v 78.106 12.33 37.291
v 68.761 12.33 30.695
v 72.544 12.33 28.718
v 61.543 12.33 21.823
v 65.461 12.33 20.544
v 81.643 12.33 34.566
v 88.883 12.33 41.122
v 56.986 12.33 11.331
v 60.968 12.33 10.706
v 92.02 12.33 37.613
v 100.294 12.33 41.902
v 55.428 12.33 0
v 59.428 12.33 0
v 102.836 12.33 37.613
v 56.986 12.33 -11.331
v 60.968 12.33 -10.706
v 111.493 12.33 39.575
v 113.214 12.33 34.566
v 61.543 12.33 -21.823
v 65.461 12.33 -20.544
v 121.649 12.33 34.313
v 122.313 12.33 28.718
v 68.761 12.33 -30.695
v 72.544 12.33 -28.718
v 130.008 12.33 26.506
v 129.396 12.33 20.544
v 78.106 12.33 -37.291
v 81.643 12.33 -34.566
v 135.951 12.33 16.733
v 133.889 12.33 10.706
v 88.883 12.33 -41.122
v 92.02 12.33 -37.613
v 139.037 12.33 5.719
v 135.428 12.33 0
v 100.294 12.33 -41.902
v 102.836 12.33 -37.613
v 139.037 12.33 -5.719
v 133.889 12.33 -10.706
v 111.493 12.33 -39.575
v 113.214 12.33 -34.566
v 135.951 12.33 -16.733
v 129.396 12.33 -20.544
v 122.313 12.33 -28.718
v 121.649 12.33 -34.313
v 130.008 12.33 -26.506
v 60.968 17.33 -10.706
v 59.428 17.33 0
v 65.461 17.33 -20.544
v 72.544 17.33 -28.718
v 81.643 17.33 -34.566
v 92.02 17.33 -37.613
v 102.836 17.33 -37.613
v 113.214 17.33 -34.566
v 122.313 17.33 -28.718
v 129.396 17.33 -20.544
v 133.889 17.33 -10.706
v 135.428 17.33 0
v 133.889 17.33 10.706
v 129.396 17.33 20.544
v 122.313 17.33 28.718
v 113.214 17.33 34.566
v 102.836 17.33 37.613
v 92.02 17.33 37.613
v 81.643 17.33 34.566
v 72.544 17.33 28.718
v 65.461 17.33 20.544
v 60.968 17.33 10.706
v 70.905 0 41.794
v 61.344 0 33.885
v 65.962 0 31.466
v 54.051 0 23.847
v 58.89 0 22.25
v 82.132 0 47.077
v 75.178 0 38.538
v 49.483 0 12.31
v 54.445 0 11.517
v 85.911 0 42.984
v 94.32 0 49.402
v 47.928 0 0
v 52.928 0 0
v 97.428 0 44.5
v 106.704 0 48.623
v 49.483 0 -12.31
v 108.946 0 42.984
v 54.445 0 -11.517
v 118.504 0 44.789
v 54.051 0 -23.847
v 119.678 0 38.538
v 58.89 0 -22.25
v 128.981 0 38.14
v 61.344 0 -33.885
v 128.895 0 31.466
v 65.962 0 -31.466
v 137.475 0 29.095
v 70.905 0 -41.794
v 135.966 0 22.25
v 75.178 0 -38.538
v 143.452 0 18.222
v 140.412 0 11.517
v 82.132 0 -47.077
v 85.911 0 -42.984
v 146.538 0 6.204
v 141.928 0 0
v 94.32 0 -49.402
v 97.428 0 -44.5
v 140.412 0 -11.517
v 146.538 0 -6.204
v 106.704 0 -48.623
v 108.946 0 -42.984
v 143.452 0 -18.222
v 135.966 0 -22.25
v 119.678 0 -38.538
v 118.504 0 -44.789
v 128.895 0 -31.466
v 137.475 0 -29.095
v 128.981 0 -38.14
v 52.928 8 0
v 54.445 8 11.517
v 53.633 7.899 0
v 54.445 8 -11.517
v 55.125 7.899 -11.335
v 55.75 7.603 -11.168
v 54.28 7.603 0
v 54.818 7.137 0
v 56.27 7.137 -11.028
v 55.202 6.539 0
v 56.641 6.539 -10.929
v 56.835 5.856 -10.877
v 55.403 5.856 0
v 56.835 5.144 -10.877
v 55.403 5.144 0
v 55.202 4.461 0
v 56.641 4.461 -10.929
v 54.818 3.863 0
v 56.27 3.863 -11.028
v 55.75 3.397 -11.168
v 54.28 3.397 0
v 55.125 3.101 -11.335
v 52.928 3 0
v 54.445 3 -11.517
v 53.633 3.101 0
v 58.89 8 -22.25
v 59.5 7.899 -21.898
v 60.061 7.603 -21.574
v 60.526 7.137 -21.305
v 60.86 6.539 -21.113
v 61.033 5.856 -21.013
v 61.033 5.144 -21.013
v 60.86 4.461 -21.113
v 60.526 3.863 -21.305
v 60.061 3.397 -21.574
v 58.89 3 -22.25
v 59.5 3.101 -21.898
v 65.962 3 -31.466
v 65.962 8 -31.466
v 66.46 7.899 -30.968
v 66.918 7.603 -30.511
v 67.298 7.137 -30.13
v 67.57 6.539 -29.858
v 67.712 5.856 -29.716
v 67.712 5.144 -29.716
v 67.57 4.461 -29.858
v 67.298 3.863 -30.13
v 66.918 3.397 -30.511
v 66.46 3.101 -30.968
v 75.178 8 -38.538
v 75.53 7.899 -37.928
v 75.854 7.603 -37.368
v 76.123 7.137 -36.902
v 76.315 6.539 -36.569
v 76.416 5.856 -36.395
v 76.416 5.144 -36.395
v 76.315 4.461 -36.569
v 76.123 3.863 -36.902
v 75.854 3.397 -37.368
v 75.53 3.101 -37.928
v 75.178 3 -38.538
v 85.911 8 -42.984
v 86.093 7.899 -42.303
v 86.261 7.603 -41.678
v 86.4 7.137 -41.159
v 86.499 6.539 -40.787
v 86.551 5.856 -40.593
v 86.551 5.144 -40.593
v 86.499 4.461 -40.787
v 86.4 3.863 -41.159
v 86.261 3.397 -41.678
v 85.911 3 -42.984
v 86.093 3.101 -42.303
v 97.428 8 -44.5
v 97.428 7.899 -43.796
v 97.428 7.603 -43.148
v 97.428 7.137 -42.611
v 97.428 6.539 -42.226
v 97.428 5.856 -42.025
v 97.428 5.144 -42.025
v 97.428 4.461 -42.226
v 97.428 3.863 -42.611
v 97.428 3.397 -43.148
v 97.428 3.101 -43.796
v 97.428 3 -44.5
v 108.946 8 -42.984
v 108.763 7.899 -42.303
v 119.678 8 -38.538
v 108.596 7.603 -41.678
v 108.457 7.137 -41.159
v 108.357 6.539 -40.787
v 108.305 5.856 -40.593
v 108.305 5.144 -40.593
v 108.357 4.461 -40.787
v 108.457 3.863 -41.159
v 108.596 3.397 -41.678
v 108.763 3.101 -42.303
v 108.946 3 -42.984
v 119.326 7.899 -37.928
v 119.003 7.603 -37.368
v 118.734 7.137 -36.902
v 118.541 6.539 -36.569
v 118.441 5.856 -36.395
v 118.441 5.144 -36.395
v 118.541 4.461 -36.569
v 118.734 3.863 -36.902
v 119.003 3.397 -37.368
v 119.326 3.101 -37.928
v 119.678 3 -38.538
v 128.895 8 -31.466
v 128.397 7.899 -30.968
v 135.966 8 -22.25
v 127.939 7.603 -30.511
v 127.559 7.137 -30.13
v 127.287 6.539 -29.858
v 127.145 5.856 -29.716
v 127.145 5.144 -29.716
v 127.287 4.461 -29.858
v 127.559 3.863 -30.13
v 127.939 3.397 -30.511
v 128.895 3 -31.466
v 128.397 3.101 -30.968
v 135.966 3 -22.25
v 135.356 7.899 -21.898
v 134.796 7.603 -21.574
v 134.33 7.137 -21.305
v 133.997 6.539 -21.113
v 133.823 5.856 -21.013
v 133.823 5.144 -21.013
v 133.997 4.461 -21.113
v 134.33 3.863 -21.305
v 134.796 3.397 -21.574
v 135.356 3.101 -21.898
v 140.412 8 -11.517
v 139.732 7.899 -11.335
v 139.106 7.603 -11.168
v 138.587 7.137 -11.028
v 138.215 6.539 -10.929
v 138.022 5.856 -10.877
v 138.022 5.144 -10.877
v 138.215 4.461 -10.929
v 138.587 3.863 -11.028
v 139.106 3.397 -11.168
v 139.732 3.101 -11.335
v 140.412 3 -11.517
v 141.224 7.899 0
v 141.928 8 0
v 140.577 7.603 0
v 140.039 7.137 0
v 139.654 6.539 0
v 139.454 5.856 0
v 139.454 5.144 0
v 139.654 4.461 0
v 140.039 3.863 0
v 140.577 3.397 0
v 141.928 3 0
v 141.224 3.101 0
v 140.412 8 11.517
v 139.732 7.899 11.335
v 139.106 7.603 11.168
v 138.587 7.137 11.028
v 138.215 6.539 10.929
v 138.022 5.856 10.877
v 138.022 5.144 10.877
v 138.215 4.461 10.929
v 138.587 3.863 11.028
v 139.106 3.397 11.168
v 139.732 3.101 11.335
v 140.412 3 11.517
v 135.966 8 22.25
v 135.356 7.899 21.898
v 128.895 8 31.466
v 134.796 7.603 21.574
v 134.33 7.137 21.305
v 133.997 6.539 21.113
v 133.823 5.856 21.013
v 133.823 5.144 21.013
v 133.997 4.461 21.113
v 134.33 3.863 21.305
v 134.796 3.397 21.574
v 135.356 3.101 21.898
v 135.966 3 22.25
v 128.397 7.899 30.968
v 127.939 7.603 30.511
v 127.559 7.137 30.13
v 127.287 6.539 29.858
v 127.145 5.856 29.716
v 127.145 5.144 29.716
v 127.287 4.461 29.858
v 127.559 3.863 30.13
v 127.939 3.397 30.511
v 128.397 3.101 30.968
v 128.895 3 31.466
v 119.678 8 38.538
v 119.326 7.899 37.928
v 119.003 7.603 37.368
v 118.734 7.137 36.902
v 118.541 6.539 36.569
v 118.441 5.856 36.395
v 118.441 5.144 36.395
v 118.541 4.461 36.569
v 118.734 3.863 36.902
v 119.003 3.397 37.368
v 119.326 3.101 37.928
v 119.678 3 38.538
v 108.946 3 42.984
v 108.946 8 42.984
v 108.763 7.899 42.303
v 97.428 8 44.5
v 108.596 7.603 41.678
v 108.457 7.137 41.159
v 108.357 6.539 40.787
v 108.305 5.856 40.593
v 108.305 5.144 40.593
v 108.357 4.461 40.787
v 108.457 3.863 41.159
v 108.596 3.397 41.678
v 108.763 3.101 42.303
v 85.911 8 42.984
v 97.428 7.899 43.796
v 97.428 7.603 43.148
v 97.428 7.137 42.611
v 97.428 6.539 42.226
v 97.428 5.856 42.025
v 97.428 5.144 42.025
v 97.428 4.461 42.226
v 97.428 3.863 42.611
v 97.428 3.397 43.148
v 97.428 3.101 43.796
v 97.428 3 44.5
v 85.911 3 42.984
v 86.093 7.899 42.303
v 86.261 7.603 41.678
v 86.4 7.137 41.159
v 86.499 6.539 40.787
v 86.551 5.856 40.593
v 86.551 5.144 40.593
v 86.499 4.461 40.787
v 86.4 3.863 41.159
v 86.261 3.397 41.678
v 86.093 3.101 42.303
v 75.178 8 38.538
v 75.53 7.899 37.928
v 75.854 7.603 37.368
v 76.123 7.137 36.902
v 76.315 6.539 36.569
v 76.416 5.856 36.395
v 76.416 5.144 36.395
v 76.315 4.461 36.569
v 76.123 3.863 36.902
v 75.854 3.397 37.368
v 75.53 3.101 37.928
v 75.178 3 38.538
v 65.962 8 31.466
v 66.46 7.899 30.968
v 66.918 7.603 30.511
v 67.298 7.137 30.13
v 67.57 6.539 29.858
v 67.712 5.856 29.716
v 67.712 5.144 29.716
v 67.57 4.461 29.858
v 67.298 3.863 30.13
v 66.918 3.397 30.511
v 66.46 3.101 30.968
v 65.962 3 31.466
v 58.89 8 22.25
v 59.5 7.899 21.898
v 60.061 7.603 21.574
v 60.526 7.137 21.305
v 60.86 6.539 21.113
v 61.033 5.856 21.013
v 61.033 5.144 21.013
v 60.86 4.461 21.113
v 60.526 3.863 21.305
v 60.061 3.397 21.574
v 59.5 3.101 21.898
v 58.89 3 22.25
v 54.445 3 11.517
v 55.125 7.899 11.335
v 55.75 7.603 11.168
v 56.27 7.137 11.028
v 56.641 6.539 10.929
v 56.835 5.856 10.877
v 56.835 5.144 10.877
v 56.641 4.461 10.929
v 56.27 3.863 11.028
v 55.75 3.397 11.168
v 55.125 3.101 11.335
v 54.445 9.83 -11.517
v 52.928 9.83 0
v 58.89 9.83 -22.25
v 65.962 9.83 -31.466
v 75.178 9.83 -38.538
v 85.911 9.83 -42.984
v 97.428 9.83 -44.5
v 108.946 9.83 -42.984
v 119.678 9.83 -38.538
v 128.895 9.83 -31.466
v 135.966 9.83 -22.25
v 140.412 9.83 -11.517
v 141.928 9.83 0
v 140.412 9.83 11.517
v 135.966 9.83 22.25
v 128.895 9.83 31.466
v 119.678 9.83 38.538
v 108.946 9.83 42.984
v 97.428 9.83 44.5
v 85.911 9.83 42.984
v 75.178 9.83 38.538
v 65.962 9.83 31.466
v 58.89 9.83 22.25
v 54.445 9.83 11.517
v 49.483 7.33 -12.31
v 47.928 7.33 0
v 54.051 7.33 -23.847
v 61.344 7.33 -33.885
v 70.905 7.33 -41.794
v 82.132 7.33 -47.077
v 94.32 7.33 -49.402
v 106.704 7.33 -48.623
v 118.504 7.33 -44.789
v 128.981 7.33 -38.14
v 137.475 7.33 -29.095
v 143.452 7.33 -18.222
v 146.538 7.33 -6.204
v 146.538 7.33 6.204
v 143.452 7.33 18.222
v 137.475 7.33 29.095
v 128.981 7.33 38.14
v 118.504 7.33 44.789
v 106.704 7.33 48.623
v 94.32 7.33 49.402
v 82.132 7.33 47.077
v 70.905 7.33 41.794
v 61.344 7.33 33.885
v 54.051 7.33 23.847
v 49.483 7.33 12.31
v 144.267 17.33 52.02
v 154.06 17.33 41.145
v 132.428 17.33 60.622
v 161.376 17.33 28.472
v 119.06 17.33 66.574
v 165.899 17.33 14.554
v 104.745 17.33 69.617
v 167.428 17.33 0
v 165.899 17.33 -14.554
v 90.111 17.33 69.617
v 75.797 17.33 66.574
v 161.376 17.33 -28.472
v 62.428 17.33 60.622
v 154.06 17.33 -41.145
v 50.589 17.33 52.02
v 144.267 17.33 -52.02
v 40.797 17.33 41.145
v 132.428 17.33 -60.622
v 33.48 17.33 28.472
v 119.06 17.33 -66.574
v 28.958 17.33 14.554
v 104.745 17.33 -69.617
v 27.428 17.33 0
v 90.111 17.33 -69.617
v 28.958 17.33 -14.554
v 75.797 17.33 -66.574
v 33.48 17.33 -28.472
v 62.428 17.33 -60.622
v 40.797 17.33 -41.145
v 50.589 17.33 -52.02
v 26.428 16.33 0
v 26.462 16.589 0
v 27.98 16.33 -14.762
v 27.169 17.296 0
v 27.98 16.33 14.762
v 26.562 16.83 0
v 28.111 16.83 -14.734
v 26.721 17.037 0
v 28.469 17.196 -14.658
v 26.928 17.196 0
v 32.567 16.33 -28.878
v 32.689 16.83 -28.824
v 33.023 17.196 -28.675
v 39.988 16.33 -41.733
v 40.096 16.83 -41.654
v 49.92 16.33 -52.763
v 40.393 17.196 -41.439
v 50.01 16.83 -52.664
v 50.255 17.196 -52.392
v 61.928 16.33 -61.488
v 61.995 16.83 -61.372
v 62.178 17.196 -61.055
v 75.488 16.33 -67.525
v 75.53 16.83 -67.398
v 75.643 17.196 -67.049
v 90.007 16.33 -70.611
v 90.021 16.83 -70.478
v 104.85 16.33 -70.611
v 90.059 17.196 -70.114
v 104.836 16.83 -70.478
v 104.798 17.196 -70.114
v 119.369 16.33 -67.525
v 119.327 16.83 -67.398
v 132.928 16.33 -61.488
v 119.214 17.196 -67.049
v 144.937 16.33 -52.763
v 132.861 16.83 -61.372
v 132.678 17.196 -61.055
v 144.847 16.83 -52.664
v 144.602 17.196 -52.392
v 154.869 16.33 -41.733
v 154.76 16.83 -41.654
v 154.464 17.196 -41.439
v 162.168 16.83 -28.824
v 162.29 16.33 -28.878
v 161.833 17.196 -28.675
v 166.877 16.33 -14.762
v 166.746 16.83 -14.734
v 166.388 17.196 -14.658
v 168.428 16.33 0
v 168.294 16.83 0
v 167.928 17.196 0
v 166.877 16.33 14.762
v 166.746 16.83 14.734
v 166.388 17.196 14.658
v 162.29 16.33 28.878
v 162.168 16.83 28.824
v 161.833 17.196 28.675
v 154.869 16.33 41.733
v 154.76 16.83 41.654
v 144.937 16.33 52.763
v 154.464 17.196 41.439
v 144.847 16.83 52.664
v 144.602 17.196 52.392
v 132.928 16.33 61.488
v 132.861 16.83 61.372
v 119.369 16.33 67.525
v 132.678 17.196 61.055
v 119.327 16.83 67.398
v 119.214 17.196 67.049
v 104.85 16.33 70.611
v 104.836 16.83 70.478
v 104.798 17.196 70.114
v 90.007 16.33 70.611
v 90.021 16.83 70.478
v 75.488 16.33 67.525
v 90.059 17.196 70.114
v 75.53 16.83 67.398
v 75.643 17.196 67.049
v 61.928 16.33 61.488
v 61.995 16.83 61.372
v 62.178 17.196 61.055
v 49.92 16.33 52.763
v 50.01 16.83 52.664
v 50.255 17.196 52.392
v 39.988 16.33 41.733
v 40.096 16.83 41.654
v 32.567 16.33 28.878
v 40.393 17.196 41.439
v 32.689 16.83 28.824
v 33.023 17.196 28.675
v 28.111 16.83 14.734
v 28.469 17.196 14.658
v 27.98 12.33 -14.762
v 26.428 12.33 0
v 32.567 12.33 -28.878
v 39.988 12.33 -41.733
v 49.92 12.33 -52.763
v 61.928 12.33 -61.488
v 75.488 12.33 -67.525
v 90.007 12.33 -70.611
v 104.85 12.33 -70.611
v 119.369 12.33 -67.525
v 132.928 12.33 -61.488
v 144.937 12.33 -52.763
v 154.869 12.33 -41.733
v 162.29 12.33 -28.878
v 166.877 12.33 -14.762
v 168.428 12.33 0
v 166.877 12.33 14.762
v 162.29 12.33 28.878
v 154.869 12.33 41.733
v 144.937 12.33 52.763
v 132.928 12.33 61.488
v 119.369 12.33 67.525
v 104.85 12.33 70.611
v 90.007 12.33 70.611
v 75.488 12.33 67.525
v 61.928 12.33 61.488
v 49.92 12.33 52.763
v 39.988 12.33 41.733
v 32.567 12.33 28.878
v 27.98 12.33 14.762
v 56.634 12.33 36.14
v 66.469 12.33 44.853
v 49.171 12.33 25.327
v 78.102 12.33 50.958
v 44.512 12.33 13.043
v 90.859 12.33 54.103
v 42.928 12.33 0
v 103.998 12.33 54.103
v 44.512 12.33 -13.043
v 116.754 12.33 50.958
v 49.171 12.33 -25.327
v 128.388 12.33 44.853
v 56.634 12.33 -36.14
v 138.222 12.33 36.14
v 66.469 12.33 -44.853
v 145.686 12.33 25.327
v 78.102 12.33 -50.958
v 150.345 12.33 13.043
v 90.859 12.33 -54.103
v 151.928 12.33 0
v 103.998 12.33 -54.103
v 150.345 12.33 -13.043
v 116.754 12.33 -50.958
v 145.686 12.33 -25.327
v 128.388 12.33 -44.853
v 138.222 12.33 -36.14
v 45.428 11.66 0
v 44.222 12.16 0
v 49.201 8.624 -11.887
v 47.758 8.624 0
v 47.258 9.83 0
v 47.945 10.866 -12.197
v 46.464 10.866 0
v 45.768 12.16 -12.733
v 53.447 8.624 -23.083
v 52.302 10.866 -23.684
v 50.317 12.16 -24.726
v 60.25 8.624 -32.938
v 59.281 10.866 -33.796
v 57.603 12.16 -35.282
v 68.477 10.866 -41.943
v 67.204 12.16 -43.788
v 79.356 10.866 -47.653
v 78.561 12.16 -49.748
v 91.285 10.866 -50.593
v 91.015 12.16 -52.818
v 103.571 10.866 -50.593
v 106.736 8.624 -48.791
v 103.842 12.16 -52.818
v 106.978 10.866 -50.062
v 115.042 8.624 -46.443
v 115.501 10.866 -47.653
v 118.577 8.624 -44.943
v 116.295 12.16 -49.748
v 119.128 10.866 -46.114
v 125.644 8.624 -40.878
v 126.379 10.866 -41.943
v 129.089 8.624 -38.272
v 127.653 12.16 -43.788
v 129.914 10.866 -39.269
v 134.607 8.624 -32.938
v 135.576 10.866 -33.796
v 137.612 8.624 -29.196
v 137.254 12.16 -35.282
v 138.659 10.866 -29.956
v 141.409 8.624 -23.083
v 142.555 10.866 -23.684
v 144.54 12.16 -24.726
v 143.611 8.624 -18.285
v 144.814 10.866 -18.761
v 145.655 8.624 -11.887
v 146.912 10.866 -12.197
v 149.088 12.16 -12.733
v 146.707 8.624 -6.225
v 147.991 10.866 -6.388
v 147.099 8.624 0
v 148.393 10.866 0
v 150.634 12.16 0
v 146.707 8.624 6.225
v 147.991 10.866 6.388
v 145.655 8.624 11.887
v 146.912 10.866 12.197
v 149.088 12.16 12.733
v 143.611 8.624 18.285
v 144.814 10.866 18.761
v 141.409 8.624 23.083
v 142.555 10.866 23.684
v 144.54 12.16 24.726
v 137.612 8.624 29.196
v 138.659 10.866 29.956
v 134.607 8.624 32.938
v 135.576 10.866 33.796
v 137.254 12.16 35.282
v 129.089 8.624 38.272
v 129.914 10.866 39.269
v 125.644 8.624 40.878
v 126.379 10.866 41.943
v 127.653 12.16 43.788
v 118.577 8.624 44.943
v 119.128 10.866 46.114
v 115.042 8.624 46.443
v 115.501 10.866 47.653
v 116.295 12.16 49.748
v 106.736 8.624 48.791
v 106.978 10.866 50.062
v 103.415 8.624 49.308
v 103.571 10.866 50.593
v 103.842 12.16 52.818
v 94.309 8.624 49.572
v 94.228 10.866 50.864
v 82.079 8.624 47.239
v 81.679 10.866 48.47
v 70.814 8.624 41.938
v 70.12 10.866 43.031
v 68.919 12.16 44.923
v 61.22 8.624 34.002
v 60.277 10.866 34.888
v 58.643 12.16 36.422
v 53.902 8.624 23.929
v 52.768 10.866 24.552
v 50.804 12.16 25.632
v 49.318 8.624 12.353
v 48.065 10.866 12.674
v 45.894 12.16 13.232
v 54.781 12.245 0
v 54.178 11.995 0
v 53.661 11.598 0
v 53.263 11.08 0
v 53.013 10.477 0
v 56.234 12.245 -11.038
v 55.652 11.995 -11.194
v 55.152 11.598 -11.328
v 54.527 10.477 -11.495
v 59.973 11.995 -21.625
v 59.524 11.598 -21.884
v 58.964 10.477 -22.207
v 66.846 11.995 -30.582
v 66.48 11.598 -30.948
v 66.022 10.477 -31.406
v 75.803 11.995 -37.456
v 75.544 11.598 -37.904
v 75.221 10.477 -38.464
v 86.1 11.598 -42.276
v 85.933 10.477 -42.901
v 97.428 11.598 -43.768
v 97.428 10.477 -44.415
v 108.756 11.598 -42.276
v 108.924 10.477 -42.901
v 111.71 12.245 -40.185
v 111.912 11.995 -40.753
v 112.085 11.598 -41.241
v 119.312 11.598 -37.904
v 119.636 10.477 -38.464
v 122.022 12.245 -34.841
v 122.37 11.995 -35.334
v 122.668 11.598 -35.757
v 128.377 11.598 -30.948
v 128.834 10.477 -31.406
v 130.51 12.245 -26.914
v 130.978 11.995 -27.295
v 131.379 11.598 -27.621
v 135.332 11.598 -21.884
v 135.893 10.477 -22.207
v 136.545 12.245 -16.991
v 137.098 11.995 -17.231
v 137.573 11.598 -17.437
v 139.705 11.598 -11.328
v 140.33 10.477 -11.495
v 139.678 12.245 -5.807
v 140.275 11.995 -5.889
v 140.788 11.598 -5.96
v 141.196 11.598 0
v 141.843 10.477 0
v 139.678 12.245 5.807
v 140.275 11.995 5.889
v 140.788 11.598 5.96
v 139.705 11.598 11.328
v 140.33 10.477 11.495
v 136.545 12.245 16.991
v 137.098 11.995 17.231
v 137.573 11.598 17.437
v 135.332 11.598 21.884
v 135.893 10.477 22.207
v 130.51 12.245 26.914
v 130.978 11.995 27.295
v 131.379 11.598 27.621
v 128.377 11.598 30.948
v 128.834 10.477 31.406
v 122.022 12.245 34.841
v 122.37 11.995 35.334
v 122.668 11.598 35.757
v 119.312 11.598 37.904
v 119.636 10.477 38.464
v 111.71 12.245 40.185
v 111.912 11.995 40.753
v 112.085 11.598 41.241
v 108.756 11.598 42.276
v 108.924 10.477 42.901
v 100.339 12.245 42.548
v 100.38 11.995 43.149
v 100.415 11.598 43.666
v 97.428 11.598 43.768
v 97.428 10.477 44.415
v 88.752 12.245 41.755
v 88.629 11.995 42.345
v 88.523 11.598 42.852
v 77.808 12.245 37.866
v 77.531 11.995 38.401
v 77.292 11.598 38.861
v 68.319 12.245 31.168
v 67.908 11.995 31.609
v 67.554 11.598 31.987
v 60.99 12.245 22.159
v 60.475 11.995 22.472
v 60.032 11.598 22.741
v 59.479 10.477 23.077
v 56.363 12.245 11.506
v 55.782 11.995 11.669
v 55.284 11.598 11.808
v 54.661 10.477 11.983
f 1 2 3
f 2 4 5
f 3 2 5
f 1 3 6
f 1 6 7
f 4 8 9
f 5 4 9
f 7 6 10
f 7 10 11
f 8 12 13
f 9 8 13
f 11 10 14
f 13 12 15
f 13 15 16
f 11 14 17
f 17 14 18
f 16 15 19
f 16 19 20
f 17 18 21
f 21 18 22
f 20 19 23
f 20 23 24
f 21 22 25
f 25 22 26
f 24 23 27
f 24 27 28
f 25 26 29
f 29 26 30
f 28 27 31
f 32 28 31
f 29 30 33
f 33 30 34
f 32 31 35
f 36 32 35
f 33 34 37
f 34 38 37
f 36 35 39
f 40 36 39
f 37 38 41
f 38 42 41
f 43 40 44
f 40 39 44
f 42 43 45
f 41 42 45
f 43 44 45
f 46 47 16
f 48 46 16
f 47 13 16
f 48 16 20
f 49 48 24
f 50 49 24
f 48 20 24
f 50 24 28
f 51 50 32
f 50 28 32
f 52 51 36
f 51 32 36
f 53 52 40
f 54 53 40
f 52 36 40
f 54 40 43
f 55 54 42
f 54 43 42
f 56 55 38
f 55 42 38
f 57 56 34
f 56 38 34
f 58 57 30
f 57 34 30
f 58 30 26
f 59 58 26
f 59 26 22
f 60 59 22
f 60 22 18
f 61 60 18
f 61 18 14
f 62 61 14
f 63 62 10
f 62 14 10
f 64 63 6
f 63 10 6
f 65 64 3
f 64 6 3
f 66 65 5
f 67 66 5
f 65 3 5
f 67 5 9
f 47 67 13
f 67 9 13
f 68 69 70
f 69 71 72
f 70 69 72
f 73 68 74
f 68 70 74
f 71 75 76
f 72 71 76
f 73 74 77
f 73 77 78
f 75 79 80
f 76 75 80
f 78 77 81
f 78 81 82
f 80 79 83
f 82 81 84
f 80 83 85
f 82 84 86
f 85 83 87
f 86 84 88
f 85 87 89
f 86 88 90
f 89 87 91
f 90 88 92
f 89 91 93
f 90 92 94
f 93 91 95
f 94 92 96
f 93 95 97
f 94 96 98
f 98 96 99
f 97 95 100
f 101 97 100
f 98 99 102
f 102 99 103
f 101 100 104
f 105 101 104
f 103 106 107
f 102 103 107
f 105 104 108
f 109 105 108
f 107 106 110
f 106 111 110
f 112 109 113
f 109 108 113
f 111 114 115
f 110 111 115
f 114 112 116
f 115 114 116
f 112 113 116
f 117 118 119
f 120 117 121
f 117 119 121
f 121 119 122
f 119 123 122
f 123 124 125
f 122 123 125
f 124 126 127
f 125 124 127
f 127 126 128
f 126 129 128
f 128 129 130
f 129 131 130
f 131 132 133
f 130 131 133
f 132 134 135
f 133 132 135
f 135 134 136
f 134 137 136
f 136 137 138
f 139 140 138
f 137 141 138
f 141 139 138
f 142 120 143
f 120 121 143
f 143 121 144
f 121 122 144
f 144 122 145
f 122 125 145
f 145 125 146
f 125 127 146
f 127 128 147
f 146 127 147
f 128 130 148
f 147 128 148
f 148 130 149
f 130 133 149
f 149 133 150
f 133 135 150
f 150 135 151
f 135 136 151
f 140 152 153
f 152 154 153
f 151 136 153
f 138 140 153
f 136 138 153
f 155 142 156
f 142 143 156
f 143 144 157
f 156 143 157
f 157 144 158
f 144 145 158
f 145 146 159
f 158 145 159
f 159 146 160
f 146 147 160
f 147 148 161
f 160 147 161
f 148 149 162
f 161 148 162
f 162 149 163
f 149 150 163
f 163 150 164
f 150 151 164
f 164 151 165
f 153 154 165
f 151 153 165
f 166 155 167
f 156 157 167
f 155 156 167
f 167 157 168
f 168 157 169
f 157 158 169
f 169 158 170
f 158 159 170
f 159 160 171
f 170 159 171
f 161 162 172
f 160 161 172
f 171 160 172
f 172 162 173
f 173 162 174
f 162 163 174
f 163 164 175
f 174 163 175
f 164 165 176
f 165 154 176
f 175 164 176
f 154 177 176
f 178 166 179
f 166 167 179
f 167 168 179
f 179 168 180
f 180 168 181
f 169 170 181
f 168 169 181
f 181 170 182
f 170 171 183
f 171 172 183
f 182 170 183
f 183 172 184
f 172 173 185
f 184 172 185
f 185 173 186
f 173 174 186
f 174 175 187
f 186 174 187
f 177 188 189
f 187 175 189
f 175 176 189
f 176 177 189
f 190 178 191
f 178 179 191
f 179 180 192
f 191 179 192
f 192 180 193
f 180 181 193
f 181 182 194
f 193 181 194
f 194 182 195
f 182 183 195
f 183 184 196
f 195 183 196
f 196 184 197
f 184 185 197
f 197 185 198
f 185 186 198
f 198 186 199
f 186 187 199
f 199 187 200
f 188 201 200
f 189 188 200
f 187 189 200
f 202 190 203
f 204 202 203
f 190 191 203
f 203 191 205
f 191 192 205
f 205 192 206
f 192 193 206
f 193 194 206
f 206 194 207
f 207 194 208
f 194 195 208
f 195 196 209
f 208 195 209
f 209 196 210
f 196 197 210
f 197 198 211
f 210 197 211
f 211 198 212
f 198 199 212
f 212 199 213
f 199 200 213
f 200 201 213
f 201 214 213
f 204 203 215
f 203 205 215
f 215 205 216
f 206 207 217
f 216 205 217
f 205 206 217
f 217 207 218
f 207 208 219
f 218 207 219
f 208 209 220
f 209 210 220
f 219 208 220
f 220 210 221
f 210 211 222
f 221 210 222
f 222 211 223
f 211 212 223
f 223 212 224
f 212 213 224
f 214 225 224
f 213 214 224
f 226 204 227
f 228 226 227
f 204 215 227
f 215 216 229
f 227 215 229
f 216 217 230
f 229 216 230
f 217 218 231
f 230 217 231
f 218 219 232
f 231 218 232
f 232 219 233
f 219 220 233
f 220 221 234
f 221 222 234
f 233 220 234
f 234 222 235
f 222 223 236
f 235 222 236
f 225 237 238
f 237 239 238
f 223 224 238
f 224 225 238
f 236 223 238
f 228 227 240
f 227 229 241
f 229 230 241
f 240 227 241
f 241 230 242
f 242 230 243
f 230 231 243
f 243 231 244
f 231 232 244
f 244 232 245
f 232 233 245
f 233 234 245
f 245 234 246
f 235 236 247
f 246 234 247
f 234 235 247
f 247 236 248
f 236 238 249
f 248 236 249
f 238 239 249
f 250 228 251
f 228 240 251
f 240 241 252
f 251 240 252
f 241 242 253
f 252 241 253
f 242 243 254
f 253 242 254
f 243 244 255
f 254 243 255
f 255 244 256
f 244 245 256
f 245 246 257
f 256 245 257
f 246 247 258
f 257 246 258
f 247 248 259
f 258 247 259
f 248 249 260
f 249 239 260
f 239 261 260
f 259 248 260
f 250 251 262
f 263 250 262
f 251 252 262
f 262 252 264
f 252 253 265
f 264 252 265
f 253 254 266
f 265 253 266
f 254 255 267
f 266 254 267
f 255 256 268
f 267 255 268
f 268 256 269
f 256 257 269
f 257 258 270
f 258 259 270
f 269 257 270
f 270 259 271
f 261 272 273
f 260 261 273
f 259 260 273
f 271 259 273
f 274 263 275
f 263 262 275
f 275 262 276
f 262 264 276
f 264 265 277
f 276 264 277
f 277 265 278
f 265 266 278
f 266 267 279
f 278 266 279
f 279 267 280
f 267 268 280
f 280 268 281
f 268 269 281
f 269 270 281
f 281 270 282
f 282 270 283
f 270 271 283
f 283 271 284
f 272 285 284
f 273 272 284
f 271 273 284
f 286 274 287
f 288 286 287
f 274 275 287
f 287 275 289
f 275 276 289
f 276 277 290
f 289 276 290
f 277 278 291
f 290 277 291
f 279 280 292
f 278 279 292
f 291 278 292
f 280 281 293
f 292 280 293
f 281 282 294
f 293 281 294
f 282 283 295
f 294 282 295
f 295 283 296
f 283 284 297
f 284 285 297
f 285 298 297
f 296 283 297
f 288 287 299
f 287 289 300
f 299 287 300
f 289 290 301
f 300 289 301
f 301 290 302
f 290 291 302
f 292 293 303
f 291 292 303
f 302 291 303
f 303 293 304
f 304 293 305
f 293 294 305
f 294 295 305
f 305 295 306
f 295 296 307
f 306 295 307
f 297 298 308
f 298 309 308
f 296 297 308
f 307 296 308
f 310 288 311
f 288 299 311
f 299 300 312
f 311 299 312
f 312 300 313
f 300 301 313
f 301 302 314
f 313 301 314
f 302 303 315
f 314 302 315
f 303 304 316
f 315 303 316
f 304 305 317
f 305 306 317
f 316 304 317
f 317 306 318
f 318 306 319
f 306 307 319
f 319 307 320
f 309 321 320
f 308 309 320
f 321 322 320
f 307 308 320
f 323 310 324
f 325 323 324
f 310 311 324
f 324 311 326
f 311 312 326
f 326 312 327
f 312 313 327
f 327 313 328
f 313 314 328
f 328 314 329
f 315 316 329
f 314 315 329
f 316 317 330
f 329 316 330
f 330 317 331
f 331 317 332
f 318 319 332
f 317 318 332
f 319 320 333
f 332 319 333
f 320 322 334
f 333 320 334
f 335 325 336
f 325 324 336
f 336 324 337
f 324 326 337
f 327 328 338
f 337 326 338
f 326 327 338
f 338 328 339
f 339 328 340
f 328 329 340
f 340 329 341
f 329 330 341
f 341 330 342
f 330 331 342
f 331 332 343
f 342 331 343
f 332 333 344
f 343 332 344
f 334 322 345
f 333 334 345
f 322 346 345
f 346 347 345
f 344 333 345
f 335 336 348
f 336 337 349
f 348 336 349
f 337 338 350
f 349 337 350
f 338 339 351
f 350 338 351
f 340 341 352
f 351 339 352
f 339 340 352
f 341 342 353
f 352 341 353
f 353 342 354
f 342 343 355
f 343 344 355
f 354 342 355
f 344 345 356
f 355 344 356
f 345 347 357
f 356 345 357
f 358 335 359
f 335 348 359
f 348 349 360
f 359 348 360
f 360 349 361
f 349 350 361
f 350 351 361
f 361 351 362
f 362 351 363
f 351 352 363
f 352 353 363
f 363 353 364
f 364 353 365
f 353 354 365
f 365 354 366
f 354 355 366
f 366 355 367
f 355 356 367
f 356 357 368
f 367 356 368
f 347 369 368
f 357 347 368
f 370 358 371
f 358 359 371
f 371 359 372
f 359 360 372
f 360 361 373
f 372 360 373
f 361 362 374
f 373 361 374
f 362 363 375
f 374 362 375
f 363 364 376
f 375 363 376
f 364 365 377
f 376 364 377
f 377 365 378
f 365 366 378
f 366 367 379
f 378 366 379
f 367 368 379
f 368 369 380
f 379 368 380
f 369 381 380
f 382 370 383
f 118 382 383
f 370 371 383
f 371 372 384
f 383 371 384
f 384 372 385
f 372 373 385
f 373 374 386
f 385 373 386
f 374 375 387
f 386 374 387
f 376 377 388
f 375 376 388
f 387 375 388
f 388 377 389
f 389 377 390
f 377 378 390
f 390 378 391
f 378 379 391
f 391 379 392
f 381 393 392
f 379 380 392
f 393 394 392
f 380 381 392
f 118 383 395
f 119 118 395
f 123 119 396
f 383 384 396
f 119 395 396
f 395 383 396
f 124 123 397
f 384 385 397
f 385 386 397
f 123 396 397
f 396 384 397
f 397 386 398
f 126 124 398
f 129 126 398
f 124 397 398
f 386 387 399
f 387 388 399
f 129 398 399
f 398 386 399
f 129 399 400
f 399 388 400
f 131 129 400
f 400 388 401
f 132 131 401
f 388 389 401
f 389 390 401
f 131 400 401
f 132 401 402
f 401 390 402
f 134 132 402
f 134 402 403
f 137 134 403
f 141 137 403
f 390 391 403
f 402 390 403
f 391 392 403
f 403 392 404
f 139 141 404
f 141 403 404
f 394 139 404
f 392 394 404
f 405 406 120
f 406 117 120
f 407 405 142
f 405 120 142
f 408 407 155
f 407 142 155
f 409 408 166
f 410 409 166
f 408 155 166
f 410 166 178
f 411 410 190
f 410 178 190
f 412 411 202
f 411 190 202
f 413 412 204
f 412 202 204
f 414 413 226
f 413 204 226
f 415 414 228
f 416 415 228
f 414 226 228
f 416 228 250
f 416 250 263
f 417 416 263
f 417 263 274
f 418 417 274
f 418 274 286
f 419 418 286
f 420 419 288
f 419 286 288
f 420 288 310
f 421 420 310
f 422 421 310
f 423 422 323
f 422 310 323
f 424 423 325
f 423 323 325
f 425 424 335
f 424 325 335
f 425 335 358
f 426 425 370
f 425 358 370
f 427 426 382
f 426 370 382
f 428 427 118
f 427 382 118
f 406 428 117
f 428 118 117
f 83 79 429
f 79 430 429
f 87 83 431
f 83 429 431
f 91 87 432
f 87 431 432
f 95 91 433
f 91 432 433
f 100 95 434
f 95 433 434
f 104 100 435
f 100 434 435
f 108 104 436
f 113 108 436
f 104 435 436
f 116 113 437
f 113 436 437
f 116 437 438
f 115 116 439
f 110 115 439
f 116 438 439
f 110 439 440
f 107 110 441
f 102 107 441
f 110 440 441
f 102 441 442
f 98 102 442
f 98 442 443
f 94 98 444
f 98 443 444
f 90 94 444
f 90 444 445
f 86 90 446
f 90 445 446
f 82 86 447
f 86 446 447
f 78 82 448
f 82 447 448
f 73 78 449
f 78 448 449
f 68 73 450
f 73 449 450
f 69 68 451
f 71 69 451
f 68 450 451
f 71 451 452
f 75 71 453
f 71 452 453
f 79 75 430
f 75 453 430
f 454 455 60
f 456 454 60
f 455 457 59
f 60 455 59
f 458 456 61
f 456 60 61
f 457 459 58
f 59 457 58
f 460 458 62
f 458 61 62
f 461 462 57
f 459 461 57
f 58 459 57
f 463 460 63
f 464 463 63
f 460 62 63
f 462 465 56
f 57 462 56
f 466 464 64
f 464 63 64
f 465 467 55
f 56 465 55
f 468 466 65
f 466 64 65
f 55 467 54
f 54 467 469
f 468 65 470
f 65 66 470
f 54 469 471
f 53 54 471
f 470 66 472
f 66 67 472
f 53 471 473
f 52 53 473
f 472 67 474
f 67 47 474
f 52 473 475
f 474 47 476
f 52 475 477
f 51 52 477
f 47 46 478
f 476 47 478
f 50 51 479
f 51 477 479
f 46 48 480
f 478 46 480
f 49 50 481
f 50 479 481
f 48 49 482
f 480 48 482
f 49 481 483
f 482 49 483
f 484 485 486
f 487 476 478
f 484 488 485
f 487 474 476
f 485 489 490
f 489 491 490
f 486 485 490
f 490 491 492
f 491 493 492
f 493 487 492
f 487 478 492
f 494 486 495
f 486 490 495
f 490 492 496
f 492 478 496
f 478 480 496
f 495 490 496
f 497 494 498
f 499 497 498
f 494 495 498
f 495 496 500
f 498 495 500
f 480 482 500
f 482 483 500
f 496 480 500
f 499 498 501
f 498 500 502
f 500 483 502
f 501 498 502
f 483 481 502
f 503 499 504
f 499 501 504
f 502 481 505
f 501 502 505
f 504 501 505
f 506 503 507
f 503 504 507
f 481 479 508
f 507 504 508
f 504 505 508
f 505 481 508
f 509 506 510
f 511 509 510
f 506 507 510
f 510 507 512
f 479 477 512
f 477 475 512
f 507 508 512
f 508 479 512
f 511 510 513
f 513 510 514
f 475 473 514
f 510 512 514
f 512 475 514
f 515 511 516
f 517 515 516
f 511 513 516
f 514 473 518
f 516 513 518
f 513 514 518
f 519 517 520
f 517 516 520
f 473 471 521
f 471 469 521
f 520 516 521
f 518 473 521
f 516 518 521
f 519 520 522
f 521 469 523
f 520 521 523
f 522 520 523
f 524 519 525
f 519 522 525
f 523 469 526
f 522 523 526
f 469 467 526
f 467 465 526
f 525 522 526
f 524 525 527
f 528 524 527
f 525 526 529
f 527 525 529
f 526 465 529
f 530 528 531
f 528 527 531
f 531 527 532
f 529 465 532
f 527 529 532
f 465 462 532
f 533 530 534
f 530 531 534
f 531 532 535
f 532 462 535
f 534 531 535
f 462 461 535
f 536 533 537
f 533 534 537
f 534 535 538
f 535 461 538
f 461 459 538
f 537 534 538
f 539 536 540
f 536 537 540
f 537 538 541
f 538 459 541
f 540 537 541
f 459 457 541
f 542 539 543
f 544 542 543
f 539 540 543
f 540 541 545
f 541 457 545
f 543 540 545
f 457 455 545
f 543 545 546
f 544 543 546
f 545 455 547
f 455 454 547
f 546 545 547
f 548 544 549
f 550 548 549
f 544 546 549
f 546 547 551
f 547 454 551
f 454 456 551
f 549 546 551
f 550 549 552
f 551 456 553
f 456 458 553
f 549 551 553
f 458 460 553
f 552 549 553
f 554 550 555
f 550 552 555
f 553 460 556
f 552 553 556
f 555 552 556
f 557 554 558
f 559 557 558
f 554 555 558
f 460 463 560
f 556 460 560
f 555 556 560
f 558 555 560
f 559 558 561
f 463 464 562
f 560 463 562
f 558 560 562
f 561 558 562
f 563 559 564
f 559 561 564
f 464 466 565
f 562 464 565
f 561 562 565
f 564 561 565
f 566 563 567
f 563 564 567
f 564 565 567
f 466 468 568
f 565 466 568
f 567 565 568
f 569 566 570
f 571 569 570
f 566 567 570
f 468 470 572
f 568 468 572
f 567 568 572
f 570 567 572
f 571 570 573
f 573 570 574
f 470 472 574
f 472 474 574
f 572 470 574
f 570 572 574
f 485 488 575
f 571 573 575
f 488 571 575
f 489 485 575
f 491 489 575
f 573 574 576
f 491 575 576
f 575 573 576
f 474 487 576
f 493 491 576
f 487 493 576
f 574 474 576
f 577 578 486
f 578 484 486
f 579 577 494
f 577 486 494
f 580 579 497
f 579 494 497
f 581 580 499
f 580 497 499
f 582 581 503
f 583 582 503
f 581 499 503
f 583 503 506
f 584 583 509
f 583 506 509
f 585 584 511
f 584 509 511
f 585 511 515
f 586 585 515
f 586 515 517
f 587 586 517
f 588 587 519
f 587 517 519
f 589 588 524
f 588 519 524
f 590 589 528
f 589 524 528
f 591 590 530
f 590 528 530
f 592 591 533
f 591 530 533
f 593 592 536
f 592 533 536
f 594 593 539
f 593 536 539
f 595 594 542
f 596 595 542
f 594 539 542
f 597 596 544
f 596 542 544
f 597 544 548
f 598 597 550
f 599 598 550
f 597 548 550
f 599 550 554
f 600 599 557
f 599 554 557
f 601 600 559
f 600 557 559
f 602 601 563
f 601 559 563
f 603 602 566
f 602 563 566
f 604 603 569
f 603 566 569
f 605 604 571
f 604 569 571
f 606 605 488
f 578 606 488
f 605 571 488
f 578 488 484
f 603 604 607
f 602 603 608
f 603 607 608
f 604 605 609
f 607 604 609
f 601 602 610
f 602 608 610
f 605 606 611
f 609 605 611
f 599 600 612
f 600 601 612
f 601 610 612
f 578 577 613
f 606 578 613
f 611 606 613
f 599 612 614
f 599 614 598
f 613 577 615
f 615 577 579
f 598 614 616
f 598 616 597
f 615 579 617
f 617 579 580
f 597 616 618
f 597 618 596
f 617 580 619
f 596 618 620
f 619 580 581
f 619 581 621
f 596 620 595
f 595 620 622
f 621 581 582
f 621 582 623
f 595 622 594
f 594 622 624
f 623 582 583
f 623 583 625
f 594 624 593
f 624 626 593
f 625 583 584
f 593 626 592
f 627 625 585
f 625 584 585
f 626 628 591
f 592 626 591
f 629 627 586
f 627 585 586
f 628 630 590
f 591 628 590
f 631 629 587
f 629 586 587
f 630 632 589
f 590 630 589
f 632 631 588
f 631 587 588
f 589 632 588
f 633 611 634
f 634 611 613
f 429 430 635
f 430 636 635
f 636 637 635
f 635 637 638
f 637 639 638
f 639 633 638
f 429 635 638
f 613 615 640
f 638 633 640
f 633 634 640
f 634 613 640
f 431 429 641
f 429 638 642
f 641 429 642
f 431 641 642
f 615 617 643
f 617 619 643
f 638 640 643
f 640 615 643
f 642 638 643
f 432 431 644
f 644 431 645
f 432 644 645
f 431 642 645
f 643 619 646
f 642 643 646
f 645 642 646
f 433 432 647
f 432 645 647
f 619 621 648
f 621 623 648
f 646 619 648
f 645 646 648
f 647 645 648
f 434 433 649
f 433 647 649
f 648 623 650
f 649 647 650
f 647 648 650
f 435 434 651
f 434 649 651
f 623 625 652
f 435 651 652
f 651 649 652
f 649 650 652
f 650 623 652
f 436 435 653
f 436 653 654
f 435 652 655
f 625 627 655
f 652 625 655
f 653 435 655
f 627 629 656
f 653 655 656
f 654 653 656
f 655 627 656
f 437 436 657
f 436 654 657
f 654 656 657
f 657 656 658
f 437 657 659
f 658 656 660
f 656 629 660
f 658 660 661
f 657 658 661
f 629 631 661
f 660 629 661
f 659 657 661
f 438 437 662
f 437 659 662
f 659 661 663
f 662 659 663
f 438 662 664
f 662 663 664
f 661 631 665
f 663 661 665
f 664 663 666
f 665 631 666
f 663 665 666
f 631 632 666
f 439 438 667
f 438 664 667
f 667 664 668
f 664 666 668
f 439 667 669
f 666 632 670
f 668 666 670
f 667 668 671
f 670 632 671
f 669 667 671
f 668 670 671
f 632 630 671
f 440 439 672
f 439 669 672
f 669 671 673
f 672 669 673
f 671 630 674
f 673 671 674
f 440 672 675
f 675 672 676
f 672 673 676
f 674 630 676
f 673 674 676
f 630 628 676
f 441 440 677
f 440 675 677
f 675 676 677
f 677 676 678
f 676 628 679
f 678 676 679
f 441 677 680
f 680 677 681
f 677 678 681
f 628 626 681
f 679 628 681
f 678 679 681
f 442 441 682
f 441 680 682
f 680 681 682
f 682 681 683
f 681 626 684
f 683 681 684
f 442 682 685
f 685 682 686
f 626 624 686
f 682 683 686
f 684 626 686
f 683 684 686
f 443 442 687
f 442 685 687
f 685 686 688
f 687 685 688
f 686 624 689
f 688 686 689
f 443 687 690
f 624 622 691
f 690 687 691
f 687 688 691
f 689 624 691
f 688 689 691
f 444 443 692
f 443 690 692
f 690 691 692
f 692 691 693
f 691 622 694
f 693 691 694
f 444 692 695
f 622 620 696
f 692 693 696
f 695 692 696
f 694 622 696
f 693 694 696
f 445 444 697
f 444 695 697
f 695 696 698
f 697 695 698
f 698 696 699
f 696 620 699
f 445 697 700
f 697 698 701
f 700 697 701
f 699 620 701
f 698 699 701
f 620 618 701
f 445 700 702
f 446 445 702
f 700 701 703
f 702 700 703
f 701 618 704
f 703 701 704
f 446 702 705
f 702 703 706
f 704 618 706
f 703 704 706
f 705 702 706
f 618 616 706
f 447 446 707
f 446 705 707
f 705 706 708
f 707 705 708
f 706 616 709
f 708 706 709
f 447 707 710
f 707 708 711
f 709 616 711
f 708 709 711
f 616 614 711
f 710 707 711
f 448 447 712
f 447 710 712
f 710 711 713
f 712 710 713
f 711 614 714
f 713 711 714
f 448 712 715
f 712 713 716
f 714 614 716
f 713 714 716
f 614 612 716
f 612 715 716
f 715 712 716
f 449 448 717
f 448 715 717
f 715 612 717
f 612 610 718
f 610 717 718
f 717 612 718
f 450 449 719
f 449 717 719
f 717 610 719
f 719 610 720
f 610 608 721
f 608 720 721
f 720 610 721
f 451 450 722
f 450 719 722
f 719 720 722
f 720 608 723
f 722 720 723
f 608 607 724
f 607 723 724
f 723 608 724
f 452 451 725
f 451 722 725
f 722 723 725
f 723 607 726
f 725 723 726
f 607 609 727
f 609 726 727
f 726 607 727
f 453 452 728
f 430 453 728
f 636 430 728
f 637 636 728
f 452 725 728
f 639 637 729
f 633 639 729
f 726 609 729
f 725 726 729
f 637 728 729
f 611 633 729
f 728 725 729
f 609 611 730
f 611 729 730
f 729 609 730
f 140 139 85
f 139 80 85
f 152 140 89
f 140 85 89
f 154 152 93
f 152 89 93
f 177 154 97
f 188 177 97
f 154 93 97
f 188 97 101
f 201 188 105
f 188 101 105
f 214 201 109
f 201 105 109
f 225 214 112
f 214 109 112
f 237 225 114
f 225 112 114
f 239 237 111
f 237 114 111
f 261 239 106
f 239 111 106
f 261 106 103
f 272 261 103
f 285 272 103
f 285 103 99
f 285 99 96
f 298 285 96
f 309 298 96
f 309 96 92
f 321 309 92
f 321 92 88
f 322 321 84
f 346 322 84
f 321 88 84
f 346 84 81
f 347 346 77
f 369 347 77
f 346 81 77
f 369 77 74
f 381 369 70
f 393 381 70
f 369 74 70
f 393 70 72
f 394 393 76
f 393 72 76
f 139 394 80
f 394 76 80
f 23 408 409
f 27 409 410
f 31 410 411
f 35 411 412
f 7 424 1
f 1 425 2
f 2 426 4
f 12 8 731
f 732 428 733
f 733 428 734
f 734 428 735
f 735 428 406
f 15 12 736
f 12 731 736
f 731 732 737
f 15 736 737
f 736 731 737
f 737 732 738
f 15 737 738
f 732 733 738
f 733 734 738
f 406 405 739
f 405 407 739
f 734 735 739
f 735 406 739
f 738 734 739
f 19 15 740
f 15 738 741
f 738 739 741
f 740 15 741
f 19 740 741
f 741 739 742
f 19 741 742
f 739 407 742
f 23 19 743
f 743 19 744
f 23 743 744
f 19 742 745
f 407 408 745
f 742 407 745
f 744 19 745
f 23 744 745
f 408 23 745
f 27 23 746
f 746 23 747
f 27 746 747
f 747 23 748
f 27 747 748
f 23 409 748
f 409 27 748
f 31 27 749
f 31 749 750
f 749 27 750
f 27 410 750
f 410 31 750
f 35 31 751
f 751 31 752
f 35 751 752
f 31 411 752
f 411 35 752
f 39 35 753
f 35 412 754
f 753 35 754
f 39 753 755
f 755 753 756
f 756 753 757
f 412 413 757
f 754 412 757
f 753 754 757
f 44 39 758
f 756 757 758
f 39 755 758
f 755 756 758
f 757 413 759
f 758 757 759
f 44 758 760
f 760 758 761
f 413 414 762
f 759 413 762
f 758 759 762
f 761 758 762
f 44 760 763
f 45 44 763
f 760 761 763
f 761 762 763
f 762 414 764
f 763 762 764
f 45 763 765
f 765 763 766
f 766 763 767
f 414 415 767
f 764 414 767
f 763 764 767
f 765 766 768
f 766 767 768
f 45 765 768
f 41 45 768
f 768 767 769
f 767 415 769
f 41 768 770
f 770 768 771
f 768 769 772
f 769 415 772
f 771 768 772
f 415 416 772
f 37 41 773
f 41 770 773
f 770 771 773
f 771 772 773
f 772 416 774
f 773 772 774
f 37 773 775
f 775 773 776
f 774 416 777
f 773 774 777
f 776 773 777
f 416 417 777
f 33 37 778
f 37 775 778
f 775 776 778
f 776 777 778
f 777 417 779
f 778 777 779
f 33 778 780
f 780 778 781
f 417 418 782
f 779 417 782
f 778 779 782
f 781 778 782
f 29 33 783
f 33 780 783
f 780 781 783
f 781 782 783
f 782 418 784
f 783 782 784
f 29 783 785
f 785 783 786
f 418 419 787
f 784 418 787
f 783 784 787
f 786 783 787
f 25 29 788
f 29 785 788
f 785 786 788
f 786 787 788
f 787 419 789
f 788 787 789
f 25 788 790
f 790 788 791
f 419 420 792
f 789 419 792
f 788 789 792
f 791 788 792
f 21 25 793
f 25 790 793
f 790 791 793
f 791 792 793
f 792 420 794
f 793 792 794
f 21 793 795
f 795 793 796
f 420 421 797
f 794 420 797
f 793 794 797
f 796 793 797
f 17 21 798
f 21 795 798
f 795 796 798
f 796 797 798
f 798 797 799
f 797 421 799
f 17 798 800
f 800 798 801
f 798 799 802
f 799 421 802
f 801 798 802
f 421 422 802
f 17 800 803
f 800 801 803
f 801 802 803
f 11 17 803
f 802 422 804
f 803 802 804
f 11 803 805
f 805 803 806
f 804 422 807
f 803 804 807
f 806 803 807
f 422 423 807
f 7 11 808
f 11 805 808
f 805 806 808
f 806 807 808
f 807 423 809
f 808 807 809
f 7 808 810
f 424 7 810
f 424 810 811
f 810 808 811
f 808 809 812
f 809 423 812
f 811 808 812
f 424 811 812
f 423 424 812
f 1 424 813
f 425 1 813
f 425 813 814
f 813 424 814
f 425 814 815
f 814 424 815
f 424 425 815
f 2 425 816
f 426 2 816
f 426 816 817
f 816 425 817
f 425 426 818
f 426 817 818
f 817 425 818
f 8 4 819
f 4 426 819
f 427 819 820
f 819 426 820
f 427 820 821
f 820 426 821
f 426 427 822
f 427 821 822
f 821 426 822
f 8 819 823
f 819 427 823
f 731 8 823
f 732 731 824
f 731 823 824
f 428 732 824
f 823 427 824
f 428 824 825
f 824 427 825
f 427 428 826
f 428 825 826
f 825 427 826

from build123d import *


with BuildPart() as part:
    # Sketch1 → Revolve1 (revolve)
    with BuildSketch(Plane.XY):
        with BuildLine():
            Line((26.42831399, 12.330127019), (26.42831399, 16.330127019))
            ThreePointArc((26.42831399, 16.330127019), (26.721207209, 17.0372338), (27.42831399, 17.330127019))
            Line((27.42831399, 17.330127019), (59.42831399, 17.330127019))
            Line((59.42831399, 17.330127019), (59.42831399, 12.330127019))
            Line((59.42831399, 12.330127019), (55.42831399, 12.330127019))
            ThreePointArc((55.42831399, 12.330127019), (53.660547037, 11.597893972), (52.92831399, 9.830127019))
            Line((52.92831399, 9.830127019), (52.92831399, 8))
            ThreePointArc((52.92831399, 8), (55.42831399, 5.5), (52.92831399, 3))
            Line((52.92831399, 3), (52.92831399, 0))
            Line((52.92831399, 0), (47.92831399, 0))
            Line((47.92831399, 0), (47.92831399, 7.330127019))
            ThreePointArc((47.92831399, 7.330127019), (46.463847896, 10.865660925), (42.92831399, 12.330127019))
            Line((42.92831399, 12.330127019), (26.42831399, 12.330127019))
        make_face()
    revolve(axis=Axis((97.42831399, 39.892585804, 0), (0, -1, 0)))


solid = part.part
